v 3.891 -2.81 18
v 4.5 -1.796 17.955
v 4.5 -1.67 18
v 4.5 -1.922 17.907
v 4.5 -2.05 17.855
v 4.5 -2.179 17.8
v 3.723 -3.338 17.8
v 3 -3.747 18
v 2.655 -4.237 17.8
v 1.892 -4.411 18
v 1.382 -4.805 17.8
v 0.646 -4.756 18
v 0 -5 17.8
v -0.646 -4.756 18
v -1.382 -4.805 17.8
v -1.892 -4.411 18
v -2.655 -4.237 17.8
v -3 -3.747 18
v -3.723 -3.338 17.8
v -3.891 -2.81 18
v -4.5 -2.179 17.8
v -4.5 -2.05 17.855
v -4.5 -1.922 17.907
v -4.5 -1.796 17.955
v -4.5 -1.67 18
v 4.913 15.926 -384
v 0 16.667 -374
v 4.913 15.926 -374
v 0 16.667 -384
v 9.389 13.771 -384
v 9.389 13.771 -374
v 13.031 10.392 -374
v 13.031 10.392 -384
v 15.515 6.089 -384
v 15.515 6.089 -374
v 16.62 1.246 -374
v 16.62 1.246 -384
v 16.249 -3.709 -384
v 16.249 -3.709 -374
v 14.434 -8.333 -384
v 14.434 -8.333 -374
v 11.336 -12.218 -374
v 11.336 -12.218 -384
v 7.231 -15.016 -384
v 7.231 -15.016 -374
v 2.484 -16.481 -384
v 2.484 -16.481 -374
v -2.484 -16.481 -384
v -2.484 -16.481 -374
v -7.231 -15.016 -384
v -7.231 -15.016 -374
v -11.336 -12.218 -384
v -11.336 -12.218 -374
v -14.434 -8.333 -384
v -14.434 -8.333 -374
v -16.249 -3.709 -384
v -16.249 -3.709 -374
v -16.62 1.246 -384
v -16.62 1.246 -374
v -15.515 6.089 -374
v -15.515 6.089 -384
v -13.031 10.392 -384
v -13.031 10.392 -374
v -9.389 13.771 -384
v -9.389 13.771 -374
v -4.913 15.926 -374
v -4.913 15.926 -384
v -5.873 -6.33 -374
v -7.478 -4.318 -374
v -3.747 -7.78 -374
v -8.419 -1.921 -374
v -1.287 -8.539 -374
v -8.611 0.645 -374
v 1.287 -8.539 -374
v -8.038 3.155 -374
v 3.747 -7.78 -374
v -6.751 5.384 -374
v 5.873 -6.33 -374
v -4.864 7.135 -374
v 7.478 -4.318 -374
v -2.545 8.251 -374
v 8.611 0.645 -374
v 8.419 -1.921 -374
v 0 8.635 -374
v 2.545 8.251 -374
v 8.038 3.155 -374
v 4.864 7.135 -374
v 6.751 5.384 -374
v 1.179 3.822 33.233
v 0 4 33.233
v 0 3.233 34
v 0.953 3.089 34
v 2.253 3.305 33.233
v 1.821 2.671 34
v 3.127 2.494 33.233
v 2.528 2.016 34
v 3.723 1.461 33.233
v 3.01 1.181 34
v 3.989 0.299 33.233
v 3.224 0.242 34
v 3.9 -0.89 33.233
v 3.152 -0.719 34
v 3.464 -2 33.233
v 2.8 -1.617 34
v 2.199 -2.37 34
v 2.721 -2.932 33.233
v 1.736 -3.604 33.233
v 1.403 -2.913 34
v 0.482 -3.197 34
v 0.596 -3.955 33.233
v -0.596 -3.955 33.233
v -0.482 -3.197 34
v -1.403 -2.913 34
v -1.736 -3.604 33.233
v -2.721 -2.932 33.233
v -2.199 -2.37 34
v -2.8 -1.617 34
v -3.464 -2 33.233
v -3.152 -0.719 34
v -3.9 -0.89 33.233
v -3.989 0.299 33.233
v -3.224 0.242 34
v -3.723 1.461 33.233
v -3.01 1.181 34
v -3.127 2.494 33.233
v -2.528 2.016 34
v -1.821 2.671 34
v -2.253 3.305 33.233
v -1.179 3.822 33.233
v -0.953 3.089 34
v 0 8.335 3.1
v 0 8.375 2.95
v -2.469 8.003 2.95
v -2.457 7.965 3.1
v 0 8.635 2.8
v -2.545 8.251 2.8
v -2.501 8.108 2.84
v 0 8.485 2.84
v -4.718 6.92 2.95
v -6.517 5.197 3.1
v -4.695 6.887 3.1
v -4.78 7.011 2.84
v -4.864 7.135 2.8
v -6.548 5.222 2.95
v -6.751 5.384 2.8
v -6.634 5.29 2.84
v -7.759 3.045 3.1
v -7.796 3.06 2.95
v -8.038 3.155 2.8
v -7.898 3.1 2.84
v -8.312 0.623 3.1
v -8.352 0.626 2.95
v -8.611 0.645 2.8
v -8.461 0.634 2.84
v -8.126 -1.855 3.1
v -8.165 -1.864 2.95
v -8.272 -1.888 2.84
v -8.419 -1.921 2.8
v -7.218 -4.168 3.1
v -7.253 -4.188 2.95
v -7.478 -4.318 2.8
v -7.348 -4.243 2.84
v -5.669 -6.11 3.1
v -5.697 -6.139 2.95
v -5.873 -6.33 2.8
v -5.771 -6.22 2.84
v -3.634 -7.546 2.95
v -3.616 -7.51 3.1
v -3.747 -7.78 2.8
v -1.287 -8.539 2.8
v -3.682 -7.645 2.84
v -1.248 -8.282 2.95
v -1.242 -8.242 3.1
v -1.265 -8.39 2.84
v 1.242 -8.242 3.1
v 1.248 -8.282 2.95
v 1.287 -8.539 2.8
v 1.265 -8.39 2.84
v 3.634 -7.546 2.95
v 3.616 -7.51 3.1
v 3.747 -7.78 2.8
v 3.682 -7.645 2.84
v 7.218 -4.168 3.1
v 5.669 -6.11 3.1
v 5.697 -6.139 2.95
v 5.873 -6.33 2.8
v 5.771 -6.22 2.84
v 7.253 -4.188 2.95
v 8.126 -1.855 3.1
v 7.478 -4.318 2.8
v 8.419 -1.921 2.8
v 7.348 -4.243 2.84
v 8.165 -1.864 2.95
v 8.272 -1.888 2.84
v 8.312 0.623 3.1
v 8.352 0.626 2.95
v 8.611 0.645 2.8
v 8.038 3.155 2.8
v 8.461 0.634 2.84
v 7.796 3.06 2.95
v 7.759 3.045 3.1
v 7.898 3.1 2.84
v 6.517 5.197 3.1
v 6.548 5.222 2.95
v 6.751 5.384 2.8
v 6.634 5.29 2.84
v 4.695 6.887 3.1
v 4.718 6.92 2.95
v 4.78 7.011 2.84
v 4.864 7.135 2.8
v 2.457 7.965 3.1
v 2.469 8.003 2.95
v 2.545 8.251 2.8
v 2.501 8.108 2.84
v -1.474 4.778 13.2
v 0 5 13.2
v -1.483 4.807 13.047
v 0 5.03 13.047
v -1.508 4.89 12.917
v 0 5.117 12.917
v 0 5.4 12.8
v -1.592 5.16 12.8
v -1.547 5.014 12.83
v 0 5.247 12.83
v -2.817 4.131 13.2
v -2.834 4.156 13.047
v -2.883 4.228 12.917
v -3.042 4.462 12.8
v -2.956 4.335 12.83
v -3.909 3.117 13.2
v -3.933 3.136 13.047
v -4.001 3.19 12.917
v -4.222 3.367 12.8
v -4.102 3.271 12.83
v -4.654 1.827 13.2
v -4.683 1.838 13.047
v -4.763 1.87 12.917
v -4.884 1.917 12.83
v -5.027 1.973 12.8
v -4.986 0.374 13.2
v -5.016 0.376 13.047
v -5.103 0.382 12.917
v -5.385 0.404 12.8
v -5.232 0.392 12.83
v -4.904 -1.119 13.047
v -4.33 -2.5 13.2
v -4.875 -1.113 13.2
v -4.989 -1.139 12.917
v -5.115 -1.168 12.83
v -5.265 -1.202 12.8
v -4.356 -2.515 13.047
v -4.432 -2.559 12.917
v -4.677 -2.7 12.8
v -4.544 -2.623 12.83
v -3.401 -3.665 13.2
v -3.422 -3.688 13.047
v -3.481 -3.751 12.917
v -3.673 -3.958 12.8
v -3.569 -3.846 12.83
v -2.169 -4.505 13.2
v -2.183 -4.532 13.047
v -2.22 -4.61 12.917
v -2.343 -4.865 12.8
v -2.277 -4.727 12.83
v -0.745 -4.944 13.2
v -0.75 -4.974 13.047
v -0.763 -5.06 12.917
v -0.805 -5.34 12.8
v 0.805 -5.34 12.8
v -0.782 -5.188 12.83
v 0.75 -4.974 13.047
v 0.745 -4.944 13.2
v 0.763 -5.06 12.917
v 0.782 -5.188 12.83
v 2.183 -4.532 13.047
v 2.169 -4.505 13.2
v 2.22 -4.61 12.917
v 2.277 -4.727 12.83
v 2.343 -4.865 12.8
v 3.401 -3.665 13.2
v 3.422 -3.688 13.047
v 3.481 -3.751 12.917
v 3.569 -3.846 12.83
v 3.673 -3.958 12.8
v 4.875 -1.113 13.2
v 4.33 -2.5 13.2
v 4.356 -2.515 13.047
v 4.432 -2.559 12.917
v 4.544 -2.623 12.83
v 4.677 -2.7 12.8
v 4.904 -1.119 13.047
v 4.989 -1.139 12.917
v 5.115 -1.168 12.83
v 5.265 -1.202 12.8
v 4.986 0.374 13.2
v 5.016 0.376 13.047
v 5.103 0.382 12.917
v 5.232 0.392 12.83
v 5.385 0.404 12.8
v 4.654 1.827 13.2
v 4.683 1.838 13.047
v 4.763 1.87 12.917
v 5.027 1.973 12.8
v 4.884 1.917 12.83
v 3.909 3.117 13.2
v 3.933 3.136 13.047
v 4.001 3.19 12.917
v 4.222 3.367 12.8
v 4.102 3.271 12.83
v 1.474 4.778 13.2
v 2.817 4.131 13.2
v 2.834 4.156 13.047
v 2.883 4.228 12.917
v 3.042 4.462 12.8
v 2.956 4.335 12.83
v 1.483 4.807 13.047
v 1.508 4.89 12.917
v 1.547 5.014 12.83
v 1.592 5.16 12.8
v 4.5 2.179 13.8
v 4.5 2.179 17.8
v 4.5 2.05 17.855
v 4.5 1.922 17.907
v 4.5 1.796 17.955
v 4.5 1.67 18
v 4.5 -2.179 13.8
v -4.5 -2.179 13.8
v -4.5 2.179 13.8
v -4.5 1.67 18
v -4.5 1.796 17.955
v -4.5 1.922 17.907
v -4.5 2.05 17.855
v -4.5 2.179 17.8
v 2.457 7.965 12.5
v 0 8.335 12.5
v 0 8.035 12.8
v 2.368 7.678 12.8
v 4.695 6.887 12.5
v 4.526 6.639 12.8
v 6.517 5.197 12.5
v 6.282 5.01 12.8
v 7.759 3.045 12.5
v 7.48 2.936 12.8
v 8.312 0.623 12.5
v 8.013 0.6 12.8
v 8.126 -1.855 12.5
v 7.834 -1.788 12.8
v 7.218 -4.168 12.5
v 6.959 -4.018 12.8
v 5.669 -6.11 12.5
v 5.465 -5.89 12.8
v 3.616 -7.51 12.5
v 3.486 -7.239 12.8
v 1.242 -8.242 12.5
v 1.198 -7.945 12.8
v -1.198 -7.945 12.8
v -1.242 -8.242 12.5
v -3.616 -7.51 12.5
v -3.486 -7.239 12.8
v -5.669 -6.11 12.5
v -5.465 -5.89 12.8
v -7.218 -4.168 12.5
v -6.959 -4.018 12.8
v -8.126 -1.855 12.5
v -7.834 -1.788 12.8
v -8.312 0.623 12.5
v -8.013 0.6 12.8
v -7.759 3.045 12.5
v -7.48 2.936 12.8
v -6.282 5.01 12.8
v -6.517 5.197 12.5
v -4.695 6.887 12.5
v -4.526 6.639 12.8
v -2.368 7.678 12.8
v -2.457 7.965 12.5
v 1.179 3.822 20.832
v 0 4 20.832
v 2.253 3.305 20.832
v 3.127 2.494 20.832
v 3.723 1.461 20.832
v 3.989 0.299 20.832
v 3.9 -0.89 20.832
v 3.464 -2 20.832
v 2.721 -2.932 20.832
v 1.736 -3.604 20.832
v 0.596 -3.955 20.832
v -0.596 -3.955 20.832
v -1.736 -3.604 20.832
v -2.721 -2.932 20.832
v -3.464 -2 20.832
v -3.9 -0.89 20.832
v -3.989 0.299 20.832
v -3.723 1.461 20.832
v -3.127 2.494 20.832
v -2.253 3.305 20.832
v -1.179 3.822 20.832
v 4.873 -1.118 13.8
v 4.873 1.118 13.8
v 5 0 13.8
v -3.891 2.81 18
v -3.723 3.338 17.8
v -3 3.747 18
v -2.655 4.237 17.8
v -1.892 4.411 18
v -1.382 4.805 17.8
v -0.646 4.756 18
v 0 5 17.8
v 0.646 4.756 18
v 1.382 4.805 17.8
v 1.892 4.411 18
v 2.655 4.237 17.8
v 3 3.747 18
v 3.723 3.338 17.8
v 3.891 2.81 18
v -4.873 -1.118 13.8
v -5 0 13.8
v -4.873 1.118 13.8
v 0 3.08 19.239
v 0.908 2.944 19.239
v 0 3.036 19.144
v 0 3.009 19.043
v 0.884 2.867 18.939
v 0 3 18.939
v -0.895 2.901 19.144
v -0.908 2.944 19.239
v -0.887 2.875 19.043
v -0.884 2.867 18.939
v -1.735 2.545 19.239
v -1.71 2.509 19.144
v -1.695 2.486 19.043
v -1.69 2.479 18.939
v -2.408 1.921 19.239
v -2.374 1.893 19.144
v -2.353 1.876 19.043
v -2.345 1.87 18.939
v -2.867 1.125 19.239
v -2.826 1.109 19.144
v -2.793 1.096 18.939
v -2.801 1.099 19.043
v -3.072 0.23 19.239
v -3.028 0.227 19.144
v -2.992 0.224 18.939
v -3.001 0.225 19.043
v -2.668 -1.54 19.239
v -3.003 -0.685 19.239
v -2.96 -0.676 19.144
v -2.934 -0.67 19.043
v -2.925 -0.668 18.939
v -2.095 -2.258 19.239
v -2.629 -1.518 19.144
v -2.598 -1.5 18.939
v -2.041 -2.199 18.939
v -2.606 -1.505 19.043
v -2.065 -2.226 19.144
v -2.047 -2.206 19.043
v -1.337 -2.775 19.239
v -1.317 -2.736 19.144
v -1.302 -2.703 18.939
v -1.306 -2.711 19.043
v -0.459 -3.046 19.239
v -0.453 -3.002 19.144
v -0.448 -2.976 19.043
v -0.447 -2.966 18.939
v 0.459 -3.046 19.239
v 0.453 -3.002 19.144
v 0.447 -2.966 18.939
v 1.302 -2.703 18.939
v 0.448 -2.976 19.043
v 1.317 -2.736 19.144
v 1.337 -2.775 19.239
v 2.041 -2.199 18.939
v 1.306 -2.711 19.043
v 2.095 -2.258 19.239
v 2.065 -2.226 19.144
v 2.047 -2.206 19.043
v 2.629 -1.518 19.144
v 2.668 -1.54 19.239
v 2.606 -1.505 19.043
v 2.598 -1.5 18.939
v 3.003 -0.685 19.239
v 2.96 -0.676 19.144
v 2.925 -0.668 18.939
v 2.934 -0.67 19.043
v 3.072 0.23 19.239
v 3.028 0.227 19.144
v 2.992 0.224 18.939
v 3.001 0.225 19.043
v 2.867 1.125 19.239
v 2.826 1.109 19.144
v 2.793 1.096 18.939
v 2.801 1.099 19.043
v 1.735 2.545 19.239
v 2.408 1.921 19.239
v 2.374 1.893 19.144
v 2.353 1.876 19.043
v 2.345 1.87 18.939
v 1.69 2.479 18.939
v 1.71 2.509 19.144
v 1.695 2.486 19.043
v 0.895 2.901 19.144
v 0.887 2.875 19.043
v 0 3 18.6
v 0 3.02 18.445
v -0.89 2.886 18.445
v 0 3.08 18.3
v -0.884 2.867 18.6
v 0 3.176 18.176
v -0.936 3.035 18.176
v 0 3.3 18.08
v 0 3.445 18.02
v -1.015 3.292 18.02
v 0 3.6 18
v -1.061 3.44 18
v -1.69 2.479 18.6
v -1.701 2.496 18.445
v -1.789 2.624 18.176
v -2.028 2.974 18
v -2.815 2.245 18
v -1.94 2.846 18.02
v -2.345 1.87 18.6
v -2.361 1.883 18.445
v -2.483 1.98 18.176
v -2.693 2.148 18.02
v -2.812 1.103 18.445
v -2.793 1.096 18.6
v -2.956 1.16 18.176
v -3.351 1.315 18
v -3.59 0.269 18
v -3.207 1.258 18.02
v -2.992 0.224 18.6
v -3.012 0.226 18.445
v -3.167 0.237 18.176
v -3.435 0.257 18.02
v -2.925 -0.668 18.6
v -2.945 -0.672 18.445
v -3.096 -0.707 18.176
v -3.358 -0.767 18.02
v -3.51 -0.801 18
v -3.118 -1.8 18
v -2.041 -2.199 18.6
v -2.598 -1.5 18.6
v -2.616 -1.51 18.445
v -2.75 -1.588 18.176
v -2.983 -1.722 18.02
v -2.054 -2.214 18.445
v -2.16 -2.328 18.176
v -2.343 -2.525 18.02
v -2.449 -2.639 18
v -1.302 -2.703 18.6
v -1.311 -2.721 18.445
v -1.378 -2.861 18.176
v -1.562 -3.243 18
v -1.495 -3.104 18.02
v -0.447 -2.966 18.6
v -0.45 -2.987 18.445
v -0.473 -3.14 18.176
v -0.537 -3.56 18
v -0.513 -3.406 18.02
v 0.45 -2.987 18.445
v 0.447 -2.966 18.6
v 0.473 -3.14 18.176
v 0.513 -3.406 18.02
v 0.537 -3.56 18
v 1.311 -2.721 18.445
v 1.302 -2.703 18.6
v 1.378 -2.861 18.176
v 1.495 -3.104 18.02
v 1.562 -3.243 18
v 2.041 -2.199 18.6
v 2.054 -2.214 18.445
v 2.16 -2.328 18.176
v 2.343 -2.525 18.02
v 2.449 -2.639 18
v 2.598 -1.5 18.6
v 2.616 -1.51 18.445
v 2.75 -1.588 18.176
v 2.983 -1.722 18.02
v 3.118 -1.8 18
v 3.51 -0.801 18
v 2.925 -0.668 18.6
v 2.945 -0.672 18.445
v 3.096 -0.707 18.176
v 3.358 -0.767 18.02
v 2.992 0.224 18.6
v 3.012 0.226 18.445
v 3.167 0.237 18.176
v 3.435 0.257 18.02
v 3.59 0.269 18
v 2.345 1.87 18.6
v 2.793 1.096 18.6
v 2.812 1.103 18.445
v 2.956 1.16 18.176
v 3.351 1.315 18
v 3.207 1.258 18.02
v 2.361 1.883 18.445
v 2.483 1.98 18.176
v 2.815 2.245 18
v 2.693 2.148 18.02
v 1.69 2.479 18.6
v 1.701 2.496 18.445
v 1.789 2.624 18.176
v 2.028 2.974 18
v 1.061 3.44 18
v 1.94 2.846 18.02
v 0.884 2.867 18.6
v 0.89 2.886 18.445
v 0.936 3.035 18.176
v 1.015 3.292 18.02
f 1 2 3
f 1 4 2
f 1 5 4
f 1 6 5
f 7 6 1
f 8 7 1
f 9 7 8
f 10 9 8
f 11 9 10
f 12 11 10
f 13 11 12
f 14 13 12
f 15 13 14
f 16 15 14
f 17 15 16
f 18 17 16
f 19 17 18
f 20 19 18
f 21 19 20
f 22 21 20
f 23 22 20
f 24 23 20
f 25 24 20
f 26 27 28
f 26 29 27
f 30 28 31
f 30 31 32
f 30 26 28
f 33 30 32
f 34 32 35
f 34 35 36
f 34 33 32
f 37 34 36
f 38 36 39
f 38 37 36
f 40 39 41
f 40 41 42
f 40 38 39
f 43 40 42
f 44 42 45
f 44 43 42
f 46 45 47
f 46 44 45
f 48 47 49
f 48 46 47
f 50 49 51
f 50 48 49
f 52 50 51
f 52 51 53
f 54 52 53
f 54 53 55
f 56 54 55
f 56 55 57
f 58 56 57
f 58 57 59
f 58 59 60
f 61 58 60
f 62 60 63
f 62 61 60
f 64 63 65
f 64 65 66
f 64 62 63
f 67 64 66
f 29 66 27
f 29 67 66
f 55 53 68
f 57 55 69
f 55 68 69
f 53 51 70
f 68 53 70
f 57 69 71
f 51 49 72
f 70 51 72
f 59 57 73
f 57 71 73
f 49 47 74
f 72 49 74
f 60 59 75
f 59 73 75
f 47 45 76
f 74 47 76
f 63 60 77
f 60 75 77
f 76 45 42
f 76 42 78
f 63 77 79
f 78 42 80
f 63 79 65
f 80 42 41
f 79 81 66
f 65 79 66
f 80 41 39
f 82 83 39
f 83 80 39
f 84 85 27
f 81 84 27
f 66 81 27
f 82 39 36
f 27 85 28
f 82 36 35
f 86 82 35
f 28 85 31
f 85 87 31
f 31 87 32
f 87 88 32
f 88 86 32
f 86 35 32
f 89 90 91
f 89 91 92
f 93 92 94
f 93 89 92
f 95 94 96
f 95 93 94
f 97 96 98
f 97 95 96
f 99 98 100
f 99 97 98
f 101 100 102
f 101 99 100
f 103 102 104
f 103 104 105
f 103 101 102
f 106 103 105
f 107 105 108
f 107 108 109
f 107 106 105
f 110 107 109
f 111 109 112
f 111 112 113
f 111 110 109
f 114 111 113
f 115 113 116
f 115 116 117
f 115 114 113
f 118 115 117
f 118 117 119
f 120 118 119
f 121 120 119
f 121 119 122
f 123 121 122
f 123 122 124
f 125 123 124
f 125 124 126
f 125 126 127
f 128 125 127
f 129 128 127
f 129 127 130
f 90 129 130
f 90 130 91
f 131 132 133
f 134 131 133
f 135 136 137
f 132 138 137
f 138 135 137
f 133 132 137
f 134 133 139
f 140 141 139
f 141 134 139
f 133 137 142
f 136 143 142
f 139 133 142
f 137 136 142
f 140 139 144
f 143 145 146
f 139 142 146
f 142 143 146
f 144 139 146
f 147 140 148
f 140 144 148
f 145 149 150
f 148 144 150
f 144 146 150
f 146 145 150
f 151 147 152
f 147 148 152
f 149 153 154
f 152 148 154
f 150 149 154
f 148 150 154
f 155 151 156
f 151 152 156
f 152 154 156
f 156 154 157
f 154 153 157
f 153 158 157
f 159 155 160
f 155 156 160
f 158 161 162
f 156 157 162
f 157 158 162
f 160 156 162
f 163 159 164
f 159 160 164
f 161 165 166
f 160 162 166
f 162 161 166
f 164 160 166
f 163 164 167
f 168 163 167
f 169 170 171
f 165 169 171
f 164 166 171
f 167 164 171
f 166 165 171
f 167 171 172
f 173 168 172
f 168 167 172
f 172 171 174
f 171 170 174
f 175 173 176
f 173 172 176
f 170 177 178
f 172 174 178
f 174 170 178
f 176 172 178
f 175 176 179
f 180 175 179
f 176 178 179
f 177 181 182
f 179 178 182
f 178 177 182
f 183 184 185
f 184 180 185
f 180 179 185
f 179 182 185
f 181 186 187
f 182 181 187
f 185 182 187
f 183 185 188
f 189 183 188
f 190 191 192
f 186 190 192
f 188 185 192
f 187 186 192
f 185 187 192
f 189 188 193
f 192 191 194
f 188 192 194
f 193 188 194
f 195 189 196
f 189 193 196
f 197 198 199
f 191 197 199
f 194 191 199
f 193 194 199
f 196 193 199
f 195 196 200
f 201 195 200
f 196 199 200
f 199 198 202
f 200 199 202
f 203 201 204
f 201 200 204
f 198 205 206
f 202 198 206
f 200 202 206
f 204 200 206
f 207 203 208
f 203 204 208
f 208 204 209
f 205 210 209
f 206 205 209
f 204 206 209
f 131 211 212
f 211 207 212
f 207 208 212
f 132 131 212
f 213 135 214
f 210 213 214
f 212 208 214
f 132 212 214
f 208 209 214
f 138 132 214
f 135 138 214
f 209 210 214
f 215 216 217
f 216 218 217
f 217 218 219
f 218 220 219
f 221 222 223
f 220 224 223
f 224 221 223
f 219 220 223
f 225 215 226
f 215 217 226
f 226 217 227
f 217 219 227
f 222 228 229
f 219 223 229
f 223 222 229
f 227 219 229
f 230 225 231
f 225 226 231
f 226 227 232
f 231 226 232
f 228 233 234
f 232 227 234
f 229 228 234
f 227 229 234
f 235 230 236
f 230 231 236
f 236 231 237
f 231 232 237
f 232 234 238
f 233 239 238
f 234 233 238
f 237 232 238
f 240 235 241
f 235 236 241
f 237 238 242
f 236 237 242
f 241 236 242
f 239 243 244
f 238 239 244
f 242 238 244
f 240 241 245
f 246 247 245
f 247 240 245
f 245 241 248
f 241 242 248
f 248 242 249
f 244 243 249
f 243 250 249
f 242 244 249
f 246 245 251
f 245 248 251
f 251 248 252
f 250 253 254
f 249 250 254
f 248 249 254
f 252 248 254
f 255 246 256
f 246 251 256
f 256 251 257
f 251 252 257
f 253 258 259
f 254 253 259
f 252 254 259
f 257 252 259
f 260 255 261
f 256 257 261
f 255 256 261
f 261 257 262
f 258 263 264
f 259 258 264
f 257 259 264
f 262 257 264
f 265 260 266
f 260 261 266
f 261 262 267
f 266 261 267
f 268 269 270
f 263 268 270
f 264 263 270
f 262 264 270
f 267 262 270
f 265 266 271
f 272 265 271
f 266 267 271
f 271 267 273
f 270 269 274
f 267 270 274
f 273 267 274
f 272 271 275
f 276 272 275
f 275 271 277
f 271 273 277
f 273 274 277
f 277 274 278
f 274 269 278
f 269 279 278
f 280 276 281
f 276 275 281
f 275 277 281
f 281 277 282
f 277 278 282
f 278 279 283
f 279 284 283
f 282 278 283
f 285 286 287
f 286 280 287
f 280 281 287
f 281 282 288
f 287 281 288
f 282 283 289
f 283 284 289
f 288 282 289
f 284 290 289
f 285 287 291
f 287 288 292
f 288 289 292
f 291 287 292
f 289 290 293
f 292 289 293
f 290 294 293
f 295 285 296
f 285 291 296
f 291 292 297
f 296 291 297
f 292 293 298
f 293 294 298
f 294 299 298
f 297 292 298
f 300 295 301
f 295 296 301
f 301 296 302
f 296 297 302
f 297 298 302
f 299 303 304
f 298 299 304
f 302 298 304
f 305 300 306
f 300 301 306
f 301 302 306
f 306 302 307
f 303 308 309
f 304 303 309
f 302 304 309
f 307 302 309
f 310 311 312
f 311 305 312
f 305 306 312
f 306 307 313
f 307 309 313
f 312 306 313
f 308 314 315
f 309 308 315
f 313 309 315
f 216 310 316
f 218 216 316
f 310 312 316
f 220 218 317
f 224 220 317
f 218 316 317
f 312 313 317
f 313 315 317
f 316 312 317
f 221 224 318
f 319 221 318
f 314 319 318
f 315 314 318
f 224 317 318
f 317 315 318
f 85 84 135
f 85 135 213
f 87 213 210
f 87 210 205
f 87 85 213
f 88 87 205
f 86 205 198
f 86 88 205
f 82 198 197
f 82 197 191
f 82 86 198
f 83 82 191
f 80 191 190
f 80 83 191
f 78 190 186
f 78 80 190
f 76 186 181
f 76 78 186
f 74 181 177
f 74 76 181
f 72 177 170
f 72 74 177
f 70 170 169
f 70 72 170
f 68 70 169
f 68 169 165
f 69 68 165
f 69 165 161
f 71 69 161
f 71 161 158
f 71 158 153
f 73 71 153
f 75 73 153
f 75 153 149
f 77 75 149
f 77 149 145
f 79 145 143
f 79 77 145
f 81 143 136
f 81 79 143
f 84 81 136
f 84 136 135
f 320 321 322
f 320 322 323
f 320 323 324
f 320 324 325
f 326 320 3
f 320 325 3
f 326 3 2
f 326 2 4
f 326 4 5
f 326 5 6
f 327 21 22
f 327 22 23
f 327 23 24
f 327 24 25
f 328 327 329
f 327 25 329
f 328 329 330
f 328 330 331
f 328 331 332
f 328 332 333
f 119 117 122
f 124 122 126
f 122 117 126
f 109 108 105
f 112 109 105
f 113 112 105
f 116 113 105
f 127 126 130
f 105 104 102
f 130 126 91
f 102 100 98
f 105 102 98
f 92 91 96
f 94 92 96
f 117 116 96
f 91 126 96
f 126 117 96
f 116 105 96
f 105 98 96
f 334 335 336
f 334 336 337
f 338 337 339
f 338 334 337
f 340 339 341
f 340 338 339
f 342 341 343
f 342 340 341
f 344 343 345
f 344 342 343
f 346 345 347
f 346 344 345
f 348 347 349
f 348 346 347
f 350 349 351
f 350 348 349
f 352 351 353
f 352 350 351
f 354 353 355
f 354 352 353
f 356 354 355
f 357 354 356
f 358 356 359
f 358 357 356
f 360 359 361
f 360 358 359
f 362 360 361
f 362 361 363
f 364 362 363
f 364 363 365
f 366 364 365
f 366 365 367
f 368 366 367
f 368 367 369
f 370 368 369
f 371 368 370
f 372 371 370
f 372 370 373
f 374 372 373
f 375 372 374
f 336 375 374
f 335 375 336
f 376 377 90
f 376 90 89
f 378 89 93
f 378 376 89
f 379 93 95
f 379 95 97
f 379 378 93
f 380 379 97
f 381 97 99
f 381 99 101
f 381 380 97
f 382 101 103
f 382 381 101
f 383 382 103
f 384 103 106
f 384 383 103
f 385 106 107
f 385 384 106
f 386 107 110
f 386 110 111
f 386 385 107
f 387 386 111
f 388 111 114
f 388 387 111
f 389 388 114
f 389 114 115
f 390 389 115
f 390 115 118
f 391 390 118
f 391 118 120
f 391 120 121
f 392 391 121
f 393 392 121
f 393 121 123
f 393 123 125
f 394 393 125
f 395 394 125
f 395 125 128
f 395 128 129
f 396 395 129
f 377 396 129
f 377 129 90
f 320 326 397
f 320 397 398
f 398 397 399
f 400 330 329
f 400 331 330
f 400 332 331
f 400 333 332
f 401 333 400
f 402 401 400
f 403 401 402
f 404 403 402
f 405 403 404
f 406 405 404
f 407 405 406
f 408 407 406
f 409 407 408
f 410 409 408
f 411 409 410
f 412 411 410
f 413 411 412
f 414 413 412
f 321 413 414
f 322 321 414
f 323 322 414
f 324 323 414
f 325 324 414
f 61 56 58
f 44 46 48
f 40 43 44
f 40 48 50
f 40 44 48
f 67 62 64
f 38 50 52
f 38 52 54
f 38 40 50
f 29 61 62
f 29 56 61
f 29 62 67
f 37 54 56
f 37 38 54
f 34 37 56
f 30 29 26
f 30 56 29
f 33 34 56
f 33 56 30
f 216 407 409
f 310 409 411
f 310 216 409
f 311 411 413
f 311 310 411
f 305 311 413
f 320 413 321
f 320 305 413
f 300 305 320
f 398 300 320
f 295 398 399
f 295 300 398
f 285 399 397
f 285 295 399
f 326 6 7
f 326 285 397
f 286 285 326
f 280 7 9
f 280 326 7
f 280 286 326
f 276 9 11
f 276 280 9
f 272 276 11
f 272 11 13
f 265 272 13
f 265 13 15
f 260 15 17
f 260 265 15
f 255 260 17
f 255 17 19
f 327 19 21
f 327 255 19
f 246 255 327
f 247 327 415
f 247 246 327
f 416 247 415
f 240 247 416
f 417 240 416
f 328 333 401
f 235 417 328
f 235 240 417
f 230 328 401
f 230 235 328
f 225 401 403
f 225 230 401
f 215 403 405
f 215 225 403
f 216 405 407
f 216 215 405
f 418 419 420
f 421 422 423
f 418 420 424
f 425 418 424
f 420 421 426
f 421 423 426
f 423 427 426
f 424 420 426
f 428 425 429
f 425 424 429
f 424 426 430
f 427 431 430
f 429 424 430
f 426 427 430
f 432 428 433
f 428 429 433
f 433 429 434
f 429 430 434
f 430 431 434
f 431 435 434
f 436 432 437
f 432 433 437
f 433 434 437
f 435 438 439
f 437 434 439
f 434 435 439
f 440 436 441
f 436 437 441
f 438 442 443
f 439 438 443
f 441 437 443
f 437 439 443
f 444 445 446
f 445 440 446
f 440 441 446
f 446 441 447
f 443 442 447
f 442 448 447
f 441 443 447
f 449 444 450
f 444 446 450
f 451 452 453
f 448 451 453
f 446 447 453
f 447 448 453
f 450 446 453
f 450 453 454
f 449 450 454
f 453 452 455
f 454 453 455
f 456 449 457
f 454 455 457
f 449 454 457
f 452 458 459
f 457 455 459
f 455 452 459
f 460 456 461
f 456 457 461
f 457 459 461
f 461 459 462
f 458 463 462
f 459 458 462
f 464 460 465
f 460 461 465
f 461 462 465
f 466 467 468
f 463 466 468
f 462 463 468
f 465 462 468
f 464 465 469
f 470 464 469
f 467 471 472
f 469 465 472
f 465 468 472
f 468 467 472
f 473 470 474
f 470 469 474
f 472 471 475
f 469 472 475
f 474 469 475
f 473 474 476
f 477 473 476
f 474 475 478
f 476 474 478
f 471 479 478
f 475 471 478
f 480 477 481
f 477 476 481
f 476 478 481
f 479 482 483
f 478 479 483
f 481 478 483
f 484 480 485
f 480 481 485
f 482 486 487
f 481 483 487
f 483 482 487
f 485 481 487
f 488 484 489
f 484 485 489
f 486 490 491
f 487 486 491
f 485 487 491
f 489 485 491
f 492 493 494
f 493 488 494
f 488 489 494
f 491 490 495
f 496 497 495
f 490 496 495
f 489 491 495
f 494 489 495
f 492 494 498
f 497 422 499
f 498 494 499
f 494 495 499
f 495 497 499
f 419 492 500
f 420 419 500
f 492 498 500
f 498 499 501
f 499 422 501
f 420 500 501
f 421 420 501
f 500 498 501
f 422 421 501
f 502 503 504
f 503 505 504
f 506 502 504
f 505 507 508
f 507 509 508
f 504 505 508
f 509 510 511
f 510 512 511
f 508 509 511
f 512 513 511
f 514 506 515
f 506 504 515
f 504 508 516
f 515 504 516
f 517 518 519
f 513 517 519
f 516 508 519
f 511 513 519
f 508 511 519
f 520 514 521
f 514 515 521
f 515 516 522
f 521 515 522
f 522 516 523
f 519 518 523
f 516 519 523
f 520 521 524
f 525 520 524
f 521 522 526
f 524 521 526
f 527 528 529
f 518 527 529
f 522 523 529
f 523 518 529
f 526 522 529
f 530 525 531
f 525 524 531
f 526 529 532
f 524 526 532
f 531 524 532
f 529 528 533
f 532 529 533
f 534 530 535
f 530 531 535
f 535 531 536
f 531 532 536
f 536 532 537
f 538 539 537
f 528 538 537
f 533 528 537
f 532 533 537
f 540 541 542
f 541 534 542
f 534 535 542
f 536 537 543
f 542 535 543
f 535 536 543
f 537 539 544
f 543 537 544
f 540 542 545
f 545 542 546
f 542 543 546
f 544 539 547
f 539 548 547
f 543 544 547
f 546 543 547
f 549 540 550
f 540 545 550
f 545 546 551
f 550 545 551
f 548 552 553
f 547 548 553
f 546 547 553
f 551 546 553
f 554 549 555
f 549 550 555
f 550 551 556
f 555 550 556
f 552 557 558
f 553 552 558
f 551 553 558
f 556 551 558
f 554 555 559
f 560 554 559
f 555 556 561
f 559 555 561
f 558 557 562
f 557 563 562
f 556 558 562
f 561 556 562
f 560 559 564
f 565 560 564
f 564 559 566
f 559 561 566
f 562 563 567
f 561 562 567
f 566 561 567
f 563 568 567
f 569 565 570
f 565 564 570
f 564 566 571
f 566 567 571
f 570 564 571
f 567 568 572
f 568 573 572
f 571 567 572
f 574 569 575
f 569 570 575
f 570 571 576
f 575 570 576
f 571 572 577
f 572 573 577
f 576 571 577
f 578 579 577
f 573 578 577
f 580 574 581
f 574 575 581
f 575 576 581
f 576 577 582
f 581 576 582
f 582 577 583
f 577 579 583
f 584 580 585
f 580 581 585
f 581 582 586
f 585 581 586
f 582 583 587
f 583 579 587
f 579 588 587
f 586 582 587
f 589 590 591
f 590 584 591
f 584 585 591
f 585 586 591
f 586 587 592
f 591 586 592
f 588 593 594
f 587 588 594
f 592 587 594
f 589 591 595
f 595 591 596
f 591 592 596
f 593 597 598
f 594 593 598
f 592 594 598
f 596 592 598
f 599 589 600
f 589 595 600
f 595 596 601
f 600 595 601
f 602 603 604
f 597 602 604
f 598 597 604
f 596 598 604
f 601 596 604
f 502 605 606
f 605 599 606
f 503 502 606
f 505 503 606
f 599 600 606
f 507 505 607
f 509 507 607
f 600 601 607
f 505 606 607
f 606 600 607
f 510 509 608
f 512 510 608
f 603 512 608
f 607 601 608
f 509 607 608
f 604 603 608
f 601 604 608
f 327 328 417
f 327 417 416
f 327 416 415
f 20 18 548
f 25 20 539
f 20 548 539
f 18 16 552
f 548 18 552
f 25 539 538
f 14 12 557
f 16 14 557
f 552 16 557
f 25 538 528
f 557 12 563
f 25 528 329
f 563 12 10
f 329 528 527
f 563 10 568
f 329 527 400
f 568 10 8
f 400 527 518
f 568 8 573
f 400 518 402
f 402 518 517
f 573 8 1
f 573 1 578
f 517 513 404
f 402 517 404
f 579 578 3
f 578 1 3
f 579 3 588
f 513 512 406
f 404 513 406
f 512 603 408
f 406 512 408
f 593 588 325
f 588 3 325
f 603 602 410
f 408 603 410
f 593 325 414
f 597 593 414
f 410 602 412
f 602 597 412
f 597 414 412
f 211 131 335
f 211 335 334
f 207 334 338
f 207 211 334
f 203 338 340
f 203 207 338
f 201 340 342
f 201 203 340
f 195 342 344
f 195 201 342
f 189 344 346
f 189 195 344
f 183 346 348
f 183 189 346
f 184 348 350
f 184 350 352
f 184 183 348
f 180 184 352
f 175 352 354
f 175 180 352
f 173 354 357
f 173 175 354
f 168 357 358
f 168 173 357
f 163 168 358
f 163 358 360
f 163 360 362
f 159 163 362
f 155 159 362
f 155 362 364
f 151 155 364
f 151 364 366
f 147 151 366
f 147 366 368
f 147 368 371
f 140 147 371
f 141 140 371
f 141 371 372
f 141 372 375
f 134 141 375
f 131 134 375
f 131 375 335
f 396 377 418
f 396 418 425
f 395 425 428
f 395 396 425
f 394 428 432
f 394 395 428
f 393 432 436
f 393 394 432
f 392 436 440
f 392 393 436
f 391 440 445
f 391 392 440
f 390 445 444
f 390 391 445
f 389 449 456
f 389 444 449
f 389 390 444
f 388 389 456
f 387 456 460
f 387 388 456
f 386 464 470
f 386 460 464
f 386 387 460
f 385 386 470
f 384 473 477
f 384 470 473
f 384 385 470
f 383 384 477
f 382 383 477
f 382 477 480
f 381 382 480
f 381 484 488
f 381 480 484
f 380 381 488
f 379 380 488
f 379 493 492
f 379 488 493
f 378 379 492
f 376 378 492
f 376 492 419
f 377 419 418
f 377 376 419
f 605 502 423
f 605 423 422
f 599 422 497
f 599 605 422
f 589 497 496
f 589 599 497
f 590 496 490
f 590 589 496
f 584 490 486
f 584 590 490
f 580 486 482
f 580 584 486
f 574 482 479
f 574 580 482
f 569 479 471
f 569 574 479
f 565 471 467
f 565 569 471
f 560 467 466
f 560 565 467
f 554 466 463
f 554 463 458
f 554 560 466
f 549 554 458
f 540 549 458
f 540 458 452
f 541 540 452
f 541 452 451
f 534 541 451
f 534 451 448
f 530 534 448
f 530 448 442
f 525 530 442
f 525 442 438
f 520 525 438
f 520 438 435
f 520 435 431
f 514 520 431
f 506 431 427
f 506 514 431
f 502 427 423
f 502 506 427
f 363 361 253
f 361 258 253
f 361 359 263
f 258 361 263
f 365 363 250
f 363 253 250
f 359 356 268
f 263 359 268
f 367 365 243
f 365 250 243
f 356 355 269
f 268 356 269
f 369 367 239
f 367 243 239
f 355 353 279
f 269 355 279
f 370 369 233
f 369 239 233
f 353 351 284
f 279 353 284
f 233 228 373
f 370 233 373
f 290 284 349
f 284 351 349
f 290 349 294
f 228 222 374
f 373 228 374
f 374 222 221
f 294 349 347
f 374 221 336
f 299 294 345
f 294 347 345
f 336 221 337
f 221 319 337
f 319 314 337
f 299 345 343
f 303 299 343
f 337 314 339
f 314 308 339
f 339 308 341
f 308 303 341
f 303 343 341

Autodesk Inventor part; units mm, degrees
sketch "Sketch_1" plane through (0, 0, 0) normal (1, 0, 0) x (0, 1, 0)
  line L0 (0, -384) -> (0, 18)
  line L1 (0, 18) -> (4.8, 18)
  line L2 (4.8, 18) -> (5, 17.8)
  line L3 (5, 17.8) -> (5, 13.2)
  arc A0 (5, 13.2) -> (5.4, 12.8) centre (5.4, 13.2) ccw
  line L4 (5.4, 12.8) -> (8.035, 12.8)
  line L5 (8.035, 12.8) -> (8.335, 12.5)
  line L6 (8.335, 12.5) -> (8.335, 3.1)
  arc A1 (8.335, 3.1) -> (8.635, 2.8) centre (8.635, 3.1) ccw
  line L7 (8.635, 2.8) -> (8.635, -374)
  line L8 (8.635, -374) -> (16.6667, -374)
  line L9 (16.6667, -374) -> (16.6667, -384)
  line L10 (16.6667, -384) -> (0, -384)
  line L11 (0, -384) -> (0, 18)
revolve "Revolution1" add sketch "Sketch_1" angle 360 about axis through (0, 0, -384) along (0, 0, -1)
sketch "Sketch_3" plane through (0, 0, 0) normal (1, 0, 0) x (0, 1, 0)
  line L0 (0, 18) -> (0, 34)
  line L1 (0, 34) -> (3.233, 34)
  line L2 (3.233, 34) -> (4, 33.233)
  line L3 (4, 33.233) -> (4, 20.8321)
  line L4 (4, 20.8321) -> (3.0804, 19.2392)
  arc A0 (3.0804, 19.2392) -> (3, 18.9392) centre (3.6, 18.9392) ccw
  line L5 (3, 18.9392) -> (3, 18.6)
  arc A1 (3, 18.6) -> (3.6, 18) centre (3.6, 18.6) ccw
  line L6 (3.6, 18) -> (0, 18)
  line L7 (0, 18) -> (0, 34)
revolve "Revolution2" add sketch "Sketch_3" angle 360 about axis through (0, 0, 18) along (0, 0, -1)
thread "Thread1" size "M8x1.25" class "6g" standard "ISO Metric profile" full length
sketch "Sketch_2" plane through (0, 0, 18) normal (0, 0, 1) x (1, 0, 0)
  line L0 (-6.5, 7) -> (-6.5, -5)
  line L1 (-6.5, -5) -> (-4.5, -5)
  line L2 (-4.5, -5) -> (-4.5, 5)
  line L3 (-4.5, 5) -> (4.5, 5)
  line L4 (4.5, 5) -> (4.5, -5)
  line L5 (4.5, -5) -> (6.5, -5)
  line L6 (6.5, -5) -> (6.5, 7)
  line L7 (6.5, 7) -> (-6.5, 7)
extrude "Extrusion1" cut sketch "Sketch_2" against normal blind 4.2
ref_plane "EAGF_XY" through (0, 0, 18) normal (0, 0, -1) x (1, 0, 0)
ref_plane "EAGF_YZ" through (0, 0, 18) normal (1, 0, 0) x (0, -1, 0)
ref_plane "EAGF_ZX" through (0, 0, 18) normal (0, -1, 0) x (0, 0, -1)
ref_plane "EPCO_KS_XY" through (0, 0, 0) normal (0, 0, -1) x (1, 0, 0)
ref_plane "EPCO_KS_YZ" through (0, 0, 0) normal (1, 0, 0) x (0, -1, 0)
ref_plane "EPCO_KS_ZX" through (0, 0, 0) normal (0, -1, 0) x (0, 0, -1)
ref_plane "NUT_XY" through (0, 0, 26) normal (0, 0, -1) x (1, 0, 0)
ref_plane "NUT_YZ" through (0, 0, 26) normal (1, 0, 0) x (0, -1, 0)
ref_plane "NUT_ZX" through (0, 0, 26) normal (0, -1, 0) x (0, 0, -1)
properties part number "1470874 EPCO-25-300_k---(1_0)"
